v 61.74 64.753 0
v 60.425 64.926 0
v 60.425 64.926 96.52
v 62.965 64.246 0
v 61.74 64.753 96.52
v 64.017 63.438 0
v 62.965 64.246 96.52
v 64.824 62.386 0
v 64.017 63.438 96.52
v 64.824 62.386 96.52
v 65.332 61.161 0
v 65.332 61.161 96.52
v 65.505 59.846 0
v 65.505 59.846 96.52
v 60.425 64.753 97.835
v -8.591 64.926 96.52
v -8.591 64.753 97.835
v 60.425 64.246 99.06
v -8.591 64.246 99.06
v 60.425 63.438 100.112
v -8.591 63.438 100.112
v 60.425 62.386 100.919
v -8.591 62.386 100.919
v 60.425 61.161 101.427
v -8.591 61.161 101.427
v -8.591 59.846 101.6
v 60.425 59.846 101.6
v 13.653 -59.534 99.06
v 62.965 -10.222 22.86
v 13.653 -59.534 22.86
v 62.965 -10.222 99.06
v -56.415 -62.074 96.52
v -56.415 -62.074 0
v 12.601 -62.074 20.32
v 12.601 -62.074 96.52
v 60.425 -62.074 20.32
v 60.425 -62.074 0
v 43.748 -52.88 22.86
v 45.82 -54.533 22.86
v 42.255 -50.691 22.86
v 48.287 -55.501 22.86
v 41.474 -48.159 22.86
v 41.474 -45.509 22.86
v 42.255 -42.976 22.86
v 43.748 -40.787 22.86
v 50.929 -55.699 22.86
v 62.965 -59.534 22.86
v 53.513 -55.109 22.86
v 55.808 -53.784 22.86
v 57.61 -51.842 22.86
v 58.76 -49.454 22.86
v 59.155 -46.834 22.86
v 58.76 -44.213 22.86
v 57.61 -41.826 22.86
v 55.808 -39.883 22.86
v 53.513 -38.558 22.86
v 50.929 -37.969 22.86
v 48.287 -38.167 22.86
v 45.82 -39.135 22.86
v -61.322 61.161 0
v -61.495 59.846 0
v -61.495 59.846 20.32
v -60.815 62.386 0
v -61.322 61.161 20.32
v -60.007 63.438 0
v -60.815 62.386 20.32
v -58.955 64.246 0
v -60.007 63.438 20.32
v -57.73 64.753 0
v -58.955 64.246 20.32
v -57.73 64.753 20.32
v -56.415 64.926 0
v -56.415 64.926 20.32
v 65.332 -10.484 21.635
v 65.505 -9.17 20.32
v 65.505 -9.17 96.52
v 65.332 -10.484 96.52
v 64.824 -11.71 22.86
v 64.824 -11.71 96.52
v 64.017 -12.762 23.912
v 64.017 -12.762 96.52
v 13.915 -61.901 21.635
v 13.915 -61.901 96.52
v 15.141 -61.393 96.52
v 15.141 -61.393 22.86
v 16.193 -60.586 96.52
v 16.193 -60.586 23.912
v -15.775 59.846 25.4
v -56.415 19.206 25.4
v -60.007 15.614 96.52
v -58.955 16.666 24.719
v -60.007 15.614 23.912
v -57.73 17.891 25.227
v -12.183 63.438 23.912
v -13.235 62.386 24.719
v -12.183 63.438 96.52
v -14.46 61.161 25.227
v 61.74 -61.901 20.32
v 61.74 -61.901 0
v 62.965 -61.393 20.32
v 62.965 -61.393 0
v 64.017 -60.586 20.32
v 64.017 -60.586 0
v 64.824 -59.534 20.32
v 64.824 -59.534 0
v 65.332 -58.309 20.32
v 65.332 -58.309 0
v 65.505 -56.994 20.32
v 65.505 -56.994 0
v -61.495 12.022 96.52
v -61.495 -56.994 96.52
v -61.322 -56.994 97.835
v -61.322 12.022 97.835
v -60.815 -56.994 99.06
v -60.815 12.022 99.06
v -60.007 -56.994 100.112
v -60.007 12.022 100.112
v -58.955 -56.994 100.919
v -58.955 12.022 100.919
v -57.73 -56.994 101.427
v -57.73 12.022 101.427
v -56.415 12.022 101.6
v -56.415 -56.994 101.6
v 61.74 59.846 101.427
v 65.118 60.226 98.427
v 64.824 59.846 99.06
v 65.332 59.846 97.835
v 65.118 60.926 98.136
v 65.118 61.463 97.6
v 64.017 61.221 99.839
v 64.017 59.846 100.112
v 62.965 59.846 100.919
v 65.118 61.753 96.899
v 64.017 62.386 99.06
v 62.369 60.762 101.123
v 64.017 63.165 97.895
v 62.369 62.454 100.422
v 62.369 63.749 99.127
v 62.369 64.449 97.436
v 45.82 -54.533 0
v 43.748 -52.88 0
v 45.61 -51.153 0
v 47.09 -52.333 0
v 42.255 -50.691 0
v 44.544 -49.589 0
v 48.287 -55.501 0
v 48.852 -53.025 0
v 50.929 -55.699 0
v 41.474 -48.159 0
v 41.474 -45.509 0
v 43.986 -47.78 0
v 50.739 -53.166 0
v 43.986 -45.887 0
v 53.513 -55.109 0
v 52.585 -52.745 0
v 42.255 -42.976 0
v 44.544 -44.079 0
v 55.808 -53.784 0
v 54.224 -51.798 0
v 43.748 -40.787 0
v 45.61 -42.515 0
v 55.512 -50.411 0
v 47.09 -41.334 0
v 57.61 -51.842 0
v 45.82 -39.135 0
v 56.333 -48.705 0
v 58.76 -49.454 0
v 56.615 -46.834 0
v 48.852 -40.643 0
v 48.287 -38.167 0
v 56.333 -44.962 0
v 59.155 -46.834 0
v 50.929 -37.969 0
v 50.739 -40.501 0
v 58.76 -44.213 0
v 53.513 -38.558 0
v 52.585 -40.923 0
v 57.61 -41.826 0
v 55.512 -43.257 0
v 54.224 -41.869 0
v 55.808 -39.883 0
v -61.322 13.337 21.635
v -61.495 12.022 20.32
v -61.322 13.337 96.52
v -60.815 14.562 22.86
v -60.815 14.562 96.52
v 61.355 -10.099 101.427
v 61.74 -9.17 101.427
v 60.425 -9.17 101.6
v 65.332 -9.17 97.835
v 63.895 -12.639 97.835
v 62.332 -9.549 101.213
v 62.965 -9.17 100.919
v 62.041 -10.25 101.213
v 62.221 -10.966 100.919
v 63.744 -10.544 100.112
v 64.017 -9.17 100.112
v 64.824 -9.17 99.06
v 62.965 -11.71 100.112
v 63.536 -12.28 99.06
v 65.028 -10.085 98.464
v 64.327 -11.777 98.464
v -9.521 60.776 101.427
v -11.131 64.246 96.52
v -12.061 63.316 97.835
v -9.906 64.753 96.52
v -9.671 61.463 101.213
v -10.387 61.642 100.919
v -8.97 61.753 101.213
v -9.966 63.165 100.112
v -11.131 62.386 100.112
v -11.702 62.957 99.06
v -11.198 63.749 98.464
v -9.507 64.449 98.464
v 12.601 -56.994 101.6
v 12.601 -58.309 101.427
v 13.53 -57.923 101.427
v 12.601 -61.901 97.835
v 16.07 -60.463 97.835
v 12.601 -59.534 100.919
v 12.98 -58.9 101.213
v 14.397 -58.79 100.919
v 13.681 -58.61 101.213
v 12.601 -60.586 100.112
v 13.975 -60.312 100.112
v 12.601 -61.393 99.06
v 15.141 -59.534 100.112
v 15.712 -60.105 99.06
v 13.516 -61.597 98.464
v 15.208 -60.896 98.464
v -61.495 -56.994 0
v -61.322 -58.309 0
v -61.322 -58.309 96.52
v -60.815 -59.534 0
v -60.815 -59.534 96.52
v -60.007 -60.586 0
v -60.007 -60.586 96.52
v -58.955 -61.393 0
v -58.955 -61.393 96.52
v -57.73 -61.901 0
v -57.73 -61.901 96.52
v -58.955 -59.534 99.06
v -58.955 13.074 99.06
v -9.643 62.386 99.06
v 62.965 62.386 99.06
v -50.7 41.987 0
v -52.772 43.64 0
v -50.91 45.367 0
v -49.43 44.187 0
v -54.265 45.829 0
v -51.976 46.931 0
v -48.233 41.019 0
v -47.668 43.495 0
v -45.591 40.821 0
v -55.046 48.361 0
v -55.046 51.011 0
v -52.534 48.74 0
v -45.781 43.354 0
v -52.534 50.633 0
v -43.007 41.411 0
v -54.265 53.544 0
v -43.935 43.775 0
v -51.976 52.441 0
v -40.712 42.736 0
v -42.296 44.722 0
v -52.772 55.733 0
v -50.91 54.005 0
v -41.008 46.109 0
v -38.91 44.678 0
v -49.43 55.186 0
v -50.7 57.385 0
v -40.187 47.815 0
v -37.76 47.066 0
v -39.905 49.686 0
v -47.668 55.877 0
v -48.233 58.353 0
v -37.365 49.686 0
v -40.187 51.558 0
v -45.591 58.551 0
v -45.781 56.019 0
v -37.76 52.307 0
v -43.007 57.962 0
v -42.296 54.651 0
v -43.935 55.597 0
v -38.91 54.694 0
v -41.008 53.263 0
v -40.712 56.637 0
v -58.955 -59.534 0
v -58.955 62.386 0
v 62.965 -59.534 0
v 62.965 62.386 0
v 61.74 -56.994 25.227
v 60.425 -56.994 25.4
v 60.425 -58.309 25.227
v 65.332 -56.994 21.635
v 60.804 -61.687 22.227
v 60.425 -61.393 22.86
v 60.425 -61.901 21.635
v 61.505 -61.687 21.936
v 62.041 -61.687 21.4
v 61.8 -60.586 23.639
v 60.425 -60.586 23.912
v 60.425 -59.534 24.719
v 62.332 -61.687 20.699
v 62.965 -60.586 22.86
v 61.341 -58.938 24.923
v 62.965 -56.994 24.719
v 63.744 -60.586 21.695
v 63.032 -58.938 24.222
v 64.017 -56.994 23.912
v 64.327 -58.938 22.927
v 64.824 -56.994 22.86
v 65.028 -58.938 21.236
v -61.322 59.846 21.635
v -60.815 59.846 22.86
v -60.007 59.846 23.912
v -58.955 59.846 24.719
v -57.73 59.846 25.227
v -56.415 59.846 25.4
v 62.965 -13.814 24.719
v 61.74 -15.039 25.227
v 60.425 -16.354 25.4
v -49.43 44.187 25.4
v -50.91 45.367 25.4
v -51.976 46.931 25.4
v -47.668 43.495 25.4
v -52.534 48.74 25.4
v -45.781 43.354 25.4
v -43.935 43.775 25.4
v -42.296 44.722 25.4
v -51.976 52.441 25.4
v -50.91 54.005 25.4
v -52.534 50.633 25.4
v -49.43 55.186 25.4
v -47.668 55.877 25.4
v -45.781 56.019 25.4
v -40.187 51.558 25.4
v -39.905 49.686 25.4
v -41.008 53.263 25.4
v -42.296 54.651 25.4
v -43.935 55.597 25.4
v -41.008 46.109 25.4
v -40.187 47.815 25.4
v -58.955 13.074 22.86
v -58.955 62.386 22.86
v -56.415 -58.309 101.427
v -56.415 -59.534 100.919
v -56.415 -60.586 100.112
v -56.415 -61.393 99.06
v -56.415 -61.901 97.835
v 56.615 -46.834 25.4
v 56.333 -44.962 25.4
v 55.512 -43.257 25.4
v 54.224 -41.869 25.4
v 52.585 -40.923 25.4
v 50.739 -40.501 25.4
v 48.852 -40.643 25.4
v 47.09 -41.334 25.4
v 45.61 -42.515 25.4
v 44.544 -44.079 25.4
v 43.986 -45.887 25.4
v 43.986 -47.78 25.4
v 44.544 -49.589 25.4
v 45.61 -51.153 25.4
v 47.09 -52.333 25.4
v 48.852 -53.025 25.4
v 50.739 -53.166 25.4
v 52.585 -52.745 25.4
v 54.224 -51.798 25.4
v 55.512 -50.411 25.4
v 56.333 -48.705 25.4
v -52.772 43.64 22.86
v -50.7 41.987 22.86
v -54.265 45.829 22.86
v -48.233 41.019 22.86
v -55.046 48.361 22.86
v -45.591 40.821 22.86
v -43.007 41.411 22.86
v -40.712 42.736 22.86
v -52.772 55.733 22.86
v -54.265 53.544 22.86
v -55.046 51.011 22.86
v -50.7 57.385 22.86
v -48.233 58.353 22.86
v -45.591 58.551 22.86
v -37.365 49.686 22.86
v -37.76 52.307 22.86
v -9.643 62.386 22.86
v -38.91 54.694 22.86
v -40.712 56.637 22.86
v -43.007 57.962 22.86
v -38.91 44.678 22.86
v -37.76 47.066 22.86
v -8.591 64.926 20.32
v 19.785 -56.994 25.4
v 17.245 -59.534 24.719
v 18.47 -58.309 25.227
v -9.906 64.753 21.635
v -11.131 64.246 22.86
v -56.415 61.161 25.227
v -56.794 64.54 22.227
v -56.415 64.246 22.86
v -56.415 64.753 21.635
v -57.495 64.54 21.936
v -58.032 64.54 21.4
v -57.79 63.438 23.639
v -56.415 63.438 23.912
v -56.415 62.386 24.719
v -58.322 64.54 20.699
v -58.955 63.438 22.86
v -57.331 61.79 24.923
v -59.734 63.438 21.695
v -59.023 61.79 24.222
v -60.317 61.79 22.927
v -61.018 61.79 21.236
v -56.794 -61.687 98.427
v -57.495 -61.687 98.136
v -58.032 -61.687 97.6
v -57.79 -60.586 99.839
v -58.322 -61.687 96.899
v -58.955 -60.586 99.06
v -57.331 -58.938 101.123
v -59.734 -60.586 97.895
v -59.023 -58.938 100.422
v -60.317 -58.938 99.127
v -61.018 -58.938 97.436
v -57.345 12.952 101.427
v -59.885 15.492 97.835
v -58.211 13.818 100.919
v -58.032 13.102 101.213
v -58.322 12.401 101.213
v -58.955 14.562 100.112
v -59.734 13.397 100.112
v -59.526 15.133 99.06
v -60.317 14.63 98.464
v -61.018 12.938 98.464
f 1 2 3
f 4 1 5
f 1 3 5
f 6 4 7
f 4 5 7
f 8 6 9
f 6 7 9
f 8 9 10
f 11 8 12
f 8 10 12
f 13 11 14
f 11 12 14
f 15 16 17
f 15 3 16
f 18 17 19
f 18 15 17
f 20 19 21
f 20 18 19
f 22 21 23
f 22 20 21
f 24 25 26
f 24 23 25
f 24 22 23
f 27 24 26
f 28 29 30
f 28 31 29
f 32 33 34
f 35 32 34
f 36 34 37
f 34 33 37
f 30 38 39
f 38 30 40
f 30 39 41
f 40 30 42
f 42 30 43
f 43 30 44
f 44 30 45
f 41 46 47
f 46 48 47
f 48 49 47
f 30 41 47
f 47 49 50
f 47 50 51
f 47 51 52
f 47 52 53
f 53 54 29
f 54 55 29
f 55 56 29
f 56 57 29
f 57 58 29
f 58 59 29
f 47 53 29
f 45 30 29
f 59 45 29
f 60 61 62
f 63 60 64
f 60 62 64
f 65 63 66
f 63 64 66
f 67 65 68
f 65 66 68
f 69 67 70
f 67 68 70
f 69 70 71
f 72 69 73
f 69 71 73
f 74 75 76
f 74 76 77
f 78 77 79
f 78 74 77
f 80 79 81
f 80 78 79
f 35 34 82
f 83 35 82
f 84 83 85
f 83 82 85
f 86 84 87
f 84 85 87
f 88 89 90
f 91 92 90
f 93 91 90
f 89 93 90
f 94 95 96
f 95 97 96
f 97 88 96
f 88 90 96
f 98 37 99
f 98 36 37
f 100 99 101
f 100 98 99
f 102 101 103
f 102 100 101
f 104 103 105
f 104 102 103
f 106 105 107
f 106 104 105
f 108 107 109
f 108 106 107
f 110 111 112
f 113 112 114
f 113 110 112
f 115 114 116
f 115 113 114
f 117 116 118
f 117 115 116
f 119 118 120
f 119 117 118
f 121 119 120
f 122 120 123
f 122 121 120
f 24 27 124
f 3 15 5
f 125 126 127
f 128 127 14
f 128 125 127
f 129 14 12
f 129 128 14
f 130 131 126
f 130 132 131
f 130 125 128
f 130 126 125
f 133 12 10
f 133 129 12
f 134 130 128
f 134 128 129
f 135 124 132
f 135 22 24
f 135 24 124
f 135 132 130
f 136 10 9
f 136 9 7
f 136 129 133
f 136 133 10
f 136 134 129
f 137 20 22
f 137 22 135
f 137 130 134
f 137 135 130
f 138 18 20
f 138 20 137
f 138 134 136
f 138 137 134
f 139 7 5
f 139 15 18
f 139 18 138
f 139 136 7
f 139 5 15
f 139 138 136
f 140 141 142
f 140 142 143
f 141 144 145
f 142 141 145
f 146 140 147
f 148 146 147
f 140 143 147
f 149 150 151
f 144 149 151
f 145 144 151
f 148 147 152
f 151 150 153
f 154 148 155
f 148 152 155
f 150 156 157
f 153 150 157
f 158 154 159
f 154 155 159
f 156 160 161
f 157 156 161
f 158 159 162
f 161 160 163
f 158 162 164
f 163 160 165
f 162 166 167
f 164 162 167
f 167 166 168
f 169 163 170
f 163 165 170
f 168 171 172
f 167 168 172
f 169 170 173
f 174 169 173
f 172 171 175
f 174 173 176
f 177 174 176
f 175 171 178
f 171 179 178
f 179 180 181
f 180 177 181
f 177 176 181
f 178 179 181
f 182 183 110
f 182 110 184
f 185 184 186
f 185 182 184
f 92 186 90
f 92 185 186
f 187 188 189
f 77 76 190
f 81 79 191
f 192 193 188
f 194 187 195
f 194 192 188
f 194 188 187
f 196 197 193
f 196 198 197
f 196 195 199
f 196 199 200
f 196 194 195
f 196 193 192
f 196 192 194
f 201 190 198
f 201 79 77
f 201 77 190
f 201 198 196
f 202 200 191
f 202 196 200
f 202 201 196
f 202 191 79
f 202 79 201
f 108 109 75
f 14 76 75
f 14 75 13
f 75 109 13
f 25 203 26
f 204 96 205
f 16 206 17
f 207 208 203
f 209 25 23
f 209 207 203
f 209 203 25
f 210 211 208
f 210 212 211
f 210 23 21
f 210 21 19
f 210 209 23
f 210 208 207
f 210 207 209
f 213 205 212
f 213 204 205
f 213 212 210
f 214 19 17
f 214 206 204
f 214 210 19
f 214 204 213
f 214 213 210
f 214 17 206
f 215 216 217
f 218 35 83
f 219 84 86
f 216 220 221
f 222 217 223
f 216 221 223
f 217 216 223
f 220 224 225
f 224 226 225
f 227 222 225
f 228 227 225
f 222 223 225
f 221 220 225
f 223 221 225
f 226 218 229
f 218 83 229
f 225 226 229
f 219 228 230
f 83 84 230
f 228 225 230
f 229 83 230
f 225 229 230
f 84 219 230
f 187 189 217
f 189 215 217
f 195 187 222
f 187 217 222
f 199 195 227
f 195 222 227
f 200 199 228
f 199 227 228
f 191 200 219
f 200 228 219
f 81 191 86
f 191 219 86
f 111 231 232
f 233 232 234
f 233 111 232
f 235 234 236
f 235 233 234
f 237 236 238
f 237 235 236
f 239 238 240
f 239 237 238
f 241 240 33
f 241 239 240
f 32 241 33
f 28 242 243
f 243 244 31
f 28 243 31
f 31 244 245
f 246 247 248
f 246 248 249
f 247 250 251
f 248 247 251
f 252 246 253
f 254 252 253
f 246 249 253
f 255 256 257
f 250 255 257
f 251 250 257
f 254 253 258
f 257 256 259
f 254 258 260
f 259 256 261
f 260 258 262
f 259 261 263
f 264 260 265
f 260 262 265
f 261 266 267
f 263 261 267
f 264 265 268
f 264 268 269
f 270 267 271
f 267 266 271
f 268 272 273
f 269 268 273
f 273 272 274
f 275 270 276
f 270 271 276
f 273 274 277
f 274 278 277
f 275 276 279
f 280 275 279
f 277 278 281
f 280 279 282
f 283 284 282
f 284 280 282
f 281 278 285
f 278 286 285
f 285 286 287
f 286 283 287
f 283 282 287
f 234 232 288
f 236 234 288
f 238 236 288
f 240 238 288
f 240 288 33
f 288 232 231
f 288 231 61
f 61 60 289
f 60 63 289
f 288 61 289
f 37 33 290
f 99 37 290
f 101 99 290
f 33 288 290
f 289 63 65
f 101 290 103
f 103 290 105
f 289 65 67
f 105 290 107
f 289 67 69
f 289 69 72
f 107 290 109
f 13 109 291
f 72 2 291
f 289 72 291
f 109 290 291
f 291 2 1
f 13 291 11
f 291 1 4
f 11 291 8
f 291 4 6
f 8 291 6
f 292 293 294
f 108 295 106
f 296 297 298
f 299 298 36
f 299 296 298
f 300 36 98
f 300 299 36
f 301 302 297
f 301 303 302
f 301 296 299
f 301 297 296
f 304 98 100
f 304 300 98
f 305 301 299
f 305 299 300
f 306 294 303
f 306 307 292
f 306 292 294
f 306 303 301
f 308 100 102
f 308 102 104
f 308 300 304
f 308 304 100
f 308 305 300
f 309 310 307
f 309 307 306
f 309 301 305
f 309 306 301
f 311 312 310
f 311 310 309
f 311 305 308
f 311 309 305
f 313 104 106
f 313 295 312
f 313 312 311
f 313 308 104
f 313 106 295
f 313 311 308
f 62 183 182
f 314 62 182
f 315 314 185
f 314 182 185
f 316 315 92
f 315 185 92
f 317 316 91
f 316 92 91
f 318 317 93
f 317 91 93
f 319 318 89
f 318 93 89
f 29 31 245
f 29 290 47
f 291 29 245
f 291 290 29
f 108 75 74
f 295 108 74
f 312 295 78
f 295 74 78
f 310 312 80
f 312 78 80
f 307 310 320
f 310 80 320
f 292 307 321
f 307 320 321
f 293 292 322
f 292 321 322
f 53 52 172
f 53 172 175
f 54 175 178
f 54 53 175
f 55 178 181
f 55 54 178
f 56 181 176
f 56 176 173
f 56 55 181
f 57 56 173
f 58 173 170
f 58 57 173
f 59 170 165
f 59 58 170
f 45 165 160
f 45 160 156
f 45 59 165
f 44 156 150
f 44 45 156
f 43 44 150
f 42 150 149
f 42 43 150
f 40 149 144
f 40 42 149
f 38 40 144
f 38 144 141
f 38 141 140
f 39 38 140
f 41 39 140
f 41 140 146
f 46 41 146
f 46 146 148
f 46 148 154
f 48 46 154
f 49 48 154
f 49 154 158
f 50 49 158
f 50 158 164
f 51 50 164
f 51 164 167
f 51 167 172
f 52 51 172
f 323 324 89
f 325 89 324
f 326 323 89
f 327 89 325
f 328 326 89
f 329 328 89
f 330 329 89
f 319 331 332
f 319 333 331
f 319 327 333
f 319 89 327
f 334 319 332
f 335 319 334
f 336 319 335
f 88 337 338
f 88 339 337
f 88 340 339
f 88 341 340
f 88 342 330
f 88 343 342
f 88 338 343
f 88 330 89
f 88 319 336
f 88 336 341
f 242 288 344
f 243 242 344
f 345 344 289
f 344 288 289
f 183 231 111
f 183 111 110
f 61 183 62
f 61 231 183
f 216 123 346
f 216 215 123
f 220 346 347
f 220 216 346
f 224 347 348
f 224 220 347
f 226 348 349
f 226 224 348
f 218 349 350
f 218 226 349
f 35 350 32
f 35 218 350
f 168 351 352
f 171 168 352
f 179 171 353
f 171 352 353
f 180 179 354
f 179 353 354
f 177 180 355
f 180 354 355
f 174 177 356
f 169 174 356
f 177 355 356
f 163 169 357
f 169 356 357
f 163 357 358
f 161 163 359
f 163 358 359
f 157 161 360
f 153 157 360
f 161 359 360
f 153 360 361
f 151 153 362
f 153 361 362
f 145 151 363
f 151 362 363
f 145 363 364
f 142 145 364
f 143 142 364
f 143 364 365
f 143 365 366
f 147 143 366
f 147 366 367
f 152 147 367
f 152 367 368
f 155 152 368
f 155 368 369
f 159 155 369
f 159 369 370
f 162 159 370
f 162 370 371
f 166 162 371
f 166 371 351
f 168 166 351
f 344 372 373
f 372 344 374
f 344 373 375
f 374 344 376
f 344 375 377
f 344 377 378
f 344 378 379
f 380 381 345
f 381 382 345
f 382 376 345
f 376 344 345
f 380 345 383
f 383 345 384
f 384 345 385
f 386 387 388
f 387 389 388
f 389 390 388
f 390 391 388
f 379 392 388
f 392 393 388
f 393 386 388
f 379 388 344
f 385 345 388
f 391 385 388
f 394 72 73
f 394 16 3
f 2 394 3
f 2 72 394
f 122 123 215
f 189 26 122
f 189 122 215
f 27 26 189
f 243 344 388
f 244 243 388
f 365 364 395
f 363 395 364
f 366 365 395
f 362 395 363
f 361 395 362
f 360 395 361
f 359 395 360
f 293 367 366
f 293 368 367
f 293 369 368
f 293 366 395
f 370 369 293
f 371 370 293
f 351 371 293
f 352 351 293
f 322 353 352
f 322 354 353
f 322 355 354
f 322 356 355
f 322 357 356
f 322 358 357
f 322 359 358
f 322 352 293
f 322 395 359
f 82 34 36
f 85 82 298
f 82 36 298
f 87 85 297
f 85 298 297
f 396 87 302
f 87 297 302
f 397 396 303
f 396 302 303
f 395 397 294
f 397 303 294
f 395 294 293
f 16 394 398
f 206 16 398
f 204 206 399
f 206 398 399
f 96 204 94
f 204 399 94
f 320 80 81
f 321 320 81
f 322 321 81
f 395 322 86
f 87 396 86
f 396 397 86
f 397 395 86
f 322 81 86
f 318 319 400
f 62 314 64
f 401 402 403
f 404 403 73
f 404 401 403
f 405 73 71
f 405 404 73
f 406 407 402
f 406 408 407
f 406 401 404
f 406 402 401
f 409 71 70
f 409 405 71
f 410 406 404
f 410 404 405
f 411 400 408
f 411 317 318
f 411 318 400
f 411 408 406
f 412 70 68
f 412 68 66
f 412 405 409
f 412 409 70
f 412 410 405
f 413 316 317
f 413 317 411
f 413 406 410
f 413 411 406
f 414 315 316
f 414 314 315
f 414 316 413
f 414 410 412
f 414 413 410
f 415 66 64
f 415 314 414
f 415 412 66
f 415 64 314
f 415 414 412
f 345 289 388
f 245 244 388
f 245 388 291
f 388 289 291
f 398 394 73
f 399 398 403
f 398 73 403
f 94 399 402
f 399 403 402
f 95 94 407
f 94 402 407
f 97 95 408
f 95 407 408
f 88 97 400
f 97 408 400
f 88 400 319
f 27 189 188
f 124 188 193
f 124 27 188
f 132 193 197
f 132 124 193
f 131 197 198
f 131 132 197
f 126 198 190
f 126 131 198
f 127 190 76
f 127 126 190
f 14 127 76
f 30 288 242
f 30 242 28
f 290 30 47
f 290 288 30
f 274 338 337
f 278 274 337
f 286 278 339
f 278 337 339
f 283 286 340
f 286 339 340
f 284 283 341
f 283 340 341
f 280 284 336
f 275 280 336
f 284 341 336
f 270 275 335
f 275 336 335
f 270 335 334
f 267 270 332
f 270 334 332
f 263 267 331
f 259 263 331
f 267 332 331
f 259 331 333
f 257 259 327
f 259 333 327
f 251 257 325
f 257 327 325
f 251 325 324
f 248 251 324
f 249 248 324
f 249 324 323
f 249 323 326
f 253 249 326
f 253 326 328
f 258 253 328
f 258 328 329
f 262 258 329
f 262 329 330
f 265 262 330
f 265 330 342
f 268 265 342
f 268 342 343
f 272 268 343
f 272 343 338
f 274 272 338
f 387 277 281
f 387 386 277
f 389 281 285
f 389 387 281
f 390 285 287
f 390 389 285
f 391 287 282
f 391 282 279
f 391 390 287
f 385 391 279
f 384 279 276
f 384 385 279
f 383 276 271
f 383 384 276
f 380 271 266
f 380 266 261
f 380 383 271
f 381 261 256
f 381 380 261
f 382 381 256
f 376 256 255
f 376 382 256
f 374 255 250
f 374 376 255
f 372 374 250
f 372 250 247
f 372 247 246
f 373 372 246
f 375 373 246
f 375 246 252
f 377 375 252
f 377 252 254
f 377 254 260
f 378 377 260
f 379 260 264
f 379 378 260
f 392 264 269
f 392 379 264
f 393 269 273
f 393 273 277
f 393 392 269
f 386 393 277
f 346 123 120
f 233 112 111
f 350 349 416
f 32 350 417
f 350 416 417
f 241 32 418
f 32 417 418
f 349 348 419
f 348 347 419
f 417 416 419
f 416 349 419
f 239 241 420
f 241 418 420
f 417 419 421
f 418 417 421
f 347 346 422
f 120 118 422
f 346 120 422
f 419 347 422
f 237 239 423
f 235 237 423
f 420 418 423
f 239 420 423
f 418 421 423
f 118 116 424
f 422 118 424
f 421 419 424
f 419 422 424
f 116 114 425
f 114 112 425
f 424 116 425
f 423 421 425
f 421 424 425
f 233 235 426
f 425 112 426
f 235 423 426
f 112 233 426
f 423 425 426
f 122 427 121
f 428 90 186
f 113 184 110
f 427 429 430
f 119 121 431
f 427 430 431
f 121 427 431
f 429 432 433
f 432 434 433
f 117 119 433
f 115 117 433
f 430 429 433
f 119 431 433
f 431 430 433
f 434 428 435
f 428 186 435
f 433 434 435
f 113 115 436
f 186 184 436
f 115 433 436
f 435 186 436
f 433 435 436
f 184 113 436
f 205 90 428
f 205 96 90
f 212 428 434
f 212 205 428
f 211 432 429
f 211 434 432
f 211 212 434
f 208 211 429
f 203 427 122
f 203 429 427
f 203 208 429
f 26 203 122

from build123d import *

# Parameters (mm, degrees)
F0_W     = 127
F0_H     = 127
F1_DEPTH = 101.6
F3_DEPTH = 76.2
F4_R     = 6.35
F5_DEPTH = 203.2
F6_T     = -2.54
F7_R     = 5.08


# Not quite as in the source:
# - a feature names something its author has since deleted; it is built from what else it names


with BuildPart() as f1:
    # F0 (on Top) → F1 (new body)
    with BuildSketch(Plane.XY):
        with Locations((2.0048860461, 1.4262827701)):
            Rectangle(F0_W, F0_H)
    extrude(amount=F1_DEPTH)

    # F2 (on face) → F3 (cut)
    with BuildSketch(Plane.XY.offset(101.6)):
        Polygon((-61.4951139539, 14.1262827701), (-10.6951139539, 64.9262827701), (-61.4951139539, 64.9262827701), align=None)
        Polygon((65.5048860461, -62.0737172299), (65.5048860461, -11.2737172299), (14.7048860461, -62.0737172299), align=None)
    extrude(amount=-F3_DEPTH, mode=Mode.SUBTRACT)

    # F4 (on face) → F5 (cut)
    with BuildSketch(Plane.XY.offset(25.4)):
        with Locations((-46.2551139539, 49.6862827701)):
            Circle(F4_R)
        with Locations((50.2648860461, -46.8337172299)):
            Circle(F4_R)
    extrude(amount=-F5_DEPTH, mode=Mode.SUBTRACT)

    # F6
    f6_openings = [f1.faces().sort_by_distance(p)[0] for p in [
        (2.004886, 1.426283, 0),
    ]]
    offset(amount=F6_T, openings=f6_openings, kind=Kind.INTERSECTION)

    # F7
    f7_edges = [f1.edges().sort_by_distance(p)[0] for p in [
        (-36.095114, 39.526283, 101.6),
        (-61.495114, -23.973717, 101.6),
        (-23.395114, -62.073717, 101.6),
        (27.404886, 64.926283, 101.6),
        (65.504886, 26.826283, 101.6),
        (40.104886, -36.673717, 101.6),
        (-61.495114, 14.126283, 63.5),
        (-10.695114, 64.926283, 63.5),
        (-61.495114, 39.526283, 25.4),
        (-36.095114, 64.926283, 25.4),
        (-61.495114, 64.926283, 12.7),
        (-61.495114, -62.073717, 50.8),
        (14.704886, -62.073717, 63.5),
        (65.504886, -11.273717, 63.5),
        (65.504886, -36.673717, 25.4),
        (40.104886, -62.073717, 25.4),
        (65.504886, -62.073717, 12.7),
        (65.504886, 64.926283, 50.8),
    ]]
    fillet(f7_edges, radius=F7_R)


solid = f1.part
